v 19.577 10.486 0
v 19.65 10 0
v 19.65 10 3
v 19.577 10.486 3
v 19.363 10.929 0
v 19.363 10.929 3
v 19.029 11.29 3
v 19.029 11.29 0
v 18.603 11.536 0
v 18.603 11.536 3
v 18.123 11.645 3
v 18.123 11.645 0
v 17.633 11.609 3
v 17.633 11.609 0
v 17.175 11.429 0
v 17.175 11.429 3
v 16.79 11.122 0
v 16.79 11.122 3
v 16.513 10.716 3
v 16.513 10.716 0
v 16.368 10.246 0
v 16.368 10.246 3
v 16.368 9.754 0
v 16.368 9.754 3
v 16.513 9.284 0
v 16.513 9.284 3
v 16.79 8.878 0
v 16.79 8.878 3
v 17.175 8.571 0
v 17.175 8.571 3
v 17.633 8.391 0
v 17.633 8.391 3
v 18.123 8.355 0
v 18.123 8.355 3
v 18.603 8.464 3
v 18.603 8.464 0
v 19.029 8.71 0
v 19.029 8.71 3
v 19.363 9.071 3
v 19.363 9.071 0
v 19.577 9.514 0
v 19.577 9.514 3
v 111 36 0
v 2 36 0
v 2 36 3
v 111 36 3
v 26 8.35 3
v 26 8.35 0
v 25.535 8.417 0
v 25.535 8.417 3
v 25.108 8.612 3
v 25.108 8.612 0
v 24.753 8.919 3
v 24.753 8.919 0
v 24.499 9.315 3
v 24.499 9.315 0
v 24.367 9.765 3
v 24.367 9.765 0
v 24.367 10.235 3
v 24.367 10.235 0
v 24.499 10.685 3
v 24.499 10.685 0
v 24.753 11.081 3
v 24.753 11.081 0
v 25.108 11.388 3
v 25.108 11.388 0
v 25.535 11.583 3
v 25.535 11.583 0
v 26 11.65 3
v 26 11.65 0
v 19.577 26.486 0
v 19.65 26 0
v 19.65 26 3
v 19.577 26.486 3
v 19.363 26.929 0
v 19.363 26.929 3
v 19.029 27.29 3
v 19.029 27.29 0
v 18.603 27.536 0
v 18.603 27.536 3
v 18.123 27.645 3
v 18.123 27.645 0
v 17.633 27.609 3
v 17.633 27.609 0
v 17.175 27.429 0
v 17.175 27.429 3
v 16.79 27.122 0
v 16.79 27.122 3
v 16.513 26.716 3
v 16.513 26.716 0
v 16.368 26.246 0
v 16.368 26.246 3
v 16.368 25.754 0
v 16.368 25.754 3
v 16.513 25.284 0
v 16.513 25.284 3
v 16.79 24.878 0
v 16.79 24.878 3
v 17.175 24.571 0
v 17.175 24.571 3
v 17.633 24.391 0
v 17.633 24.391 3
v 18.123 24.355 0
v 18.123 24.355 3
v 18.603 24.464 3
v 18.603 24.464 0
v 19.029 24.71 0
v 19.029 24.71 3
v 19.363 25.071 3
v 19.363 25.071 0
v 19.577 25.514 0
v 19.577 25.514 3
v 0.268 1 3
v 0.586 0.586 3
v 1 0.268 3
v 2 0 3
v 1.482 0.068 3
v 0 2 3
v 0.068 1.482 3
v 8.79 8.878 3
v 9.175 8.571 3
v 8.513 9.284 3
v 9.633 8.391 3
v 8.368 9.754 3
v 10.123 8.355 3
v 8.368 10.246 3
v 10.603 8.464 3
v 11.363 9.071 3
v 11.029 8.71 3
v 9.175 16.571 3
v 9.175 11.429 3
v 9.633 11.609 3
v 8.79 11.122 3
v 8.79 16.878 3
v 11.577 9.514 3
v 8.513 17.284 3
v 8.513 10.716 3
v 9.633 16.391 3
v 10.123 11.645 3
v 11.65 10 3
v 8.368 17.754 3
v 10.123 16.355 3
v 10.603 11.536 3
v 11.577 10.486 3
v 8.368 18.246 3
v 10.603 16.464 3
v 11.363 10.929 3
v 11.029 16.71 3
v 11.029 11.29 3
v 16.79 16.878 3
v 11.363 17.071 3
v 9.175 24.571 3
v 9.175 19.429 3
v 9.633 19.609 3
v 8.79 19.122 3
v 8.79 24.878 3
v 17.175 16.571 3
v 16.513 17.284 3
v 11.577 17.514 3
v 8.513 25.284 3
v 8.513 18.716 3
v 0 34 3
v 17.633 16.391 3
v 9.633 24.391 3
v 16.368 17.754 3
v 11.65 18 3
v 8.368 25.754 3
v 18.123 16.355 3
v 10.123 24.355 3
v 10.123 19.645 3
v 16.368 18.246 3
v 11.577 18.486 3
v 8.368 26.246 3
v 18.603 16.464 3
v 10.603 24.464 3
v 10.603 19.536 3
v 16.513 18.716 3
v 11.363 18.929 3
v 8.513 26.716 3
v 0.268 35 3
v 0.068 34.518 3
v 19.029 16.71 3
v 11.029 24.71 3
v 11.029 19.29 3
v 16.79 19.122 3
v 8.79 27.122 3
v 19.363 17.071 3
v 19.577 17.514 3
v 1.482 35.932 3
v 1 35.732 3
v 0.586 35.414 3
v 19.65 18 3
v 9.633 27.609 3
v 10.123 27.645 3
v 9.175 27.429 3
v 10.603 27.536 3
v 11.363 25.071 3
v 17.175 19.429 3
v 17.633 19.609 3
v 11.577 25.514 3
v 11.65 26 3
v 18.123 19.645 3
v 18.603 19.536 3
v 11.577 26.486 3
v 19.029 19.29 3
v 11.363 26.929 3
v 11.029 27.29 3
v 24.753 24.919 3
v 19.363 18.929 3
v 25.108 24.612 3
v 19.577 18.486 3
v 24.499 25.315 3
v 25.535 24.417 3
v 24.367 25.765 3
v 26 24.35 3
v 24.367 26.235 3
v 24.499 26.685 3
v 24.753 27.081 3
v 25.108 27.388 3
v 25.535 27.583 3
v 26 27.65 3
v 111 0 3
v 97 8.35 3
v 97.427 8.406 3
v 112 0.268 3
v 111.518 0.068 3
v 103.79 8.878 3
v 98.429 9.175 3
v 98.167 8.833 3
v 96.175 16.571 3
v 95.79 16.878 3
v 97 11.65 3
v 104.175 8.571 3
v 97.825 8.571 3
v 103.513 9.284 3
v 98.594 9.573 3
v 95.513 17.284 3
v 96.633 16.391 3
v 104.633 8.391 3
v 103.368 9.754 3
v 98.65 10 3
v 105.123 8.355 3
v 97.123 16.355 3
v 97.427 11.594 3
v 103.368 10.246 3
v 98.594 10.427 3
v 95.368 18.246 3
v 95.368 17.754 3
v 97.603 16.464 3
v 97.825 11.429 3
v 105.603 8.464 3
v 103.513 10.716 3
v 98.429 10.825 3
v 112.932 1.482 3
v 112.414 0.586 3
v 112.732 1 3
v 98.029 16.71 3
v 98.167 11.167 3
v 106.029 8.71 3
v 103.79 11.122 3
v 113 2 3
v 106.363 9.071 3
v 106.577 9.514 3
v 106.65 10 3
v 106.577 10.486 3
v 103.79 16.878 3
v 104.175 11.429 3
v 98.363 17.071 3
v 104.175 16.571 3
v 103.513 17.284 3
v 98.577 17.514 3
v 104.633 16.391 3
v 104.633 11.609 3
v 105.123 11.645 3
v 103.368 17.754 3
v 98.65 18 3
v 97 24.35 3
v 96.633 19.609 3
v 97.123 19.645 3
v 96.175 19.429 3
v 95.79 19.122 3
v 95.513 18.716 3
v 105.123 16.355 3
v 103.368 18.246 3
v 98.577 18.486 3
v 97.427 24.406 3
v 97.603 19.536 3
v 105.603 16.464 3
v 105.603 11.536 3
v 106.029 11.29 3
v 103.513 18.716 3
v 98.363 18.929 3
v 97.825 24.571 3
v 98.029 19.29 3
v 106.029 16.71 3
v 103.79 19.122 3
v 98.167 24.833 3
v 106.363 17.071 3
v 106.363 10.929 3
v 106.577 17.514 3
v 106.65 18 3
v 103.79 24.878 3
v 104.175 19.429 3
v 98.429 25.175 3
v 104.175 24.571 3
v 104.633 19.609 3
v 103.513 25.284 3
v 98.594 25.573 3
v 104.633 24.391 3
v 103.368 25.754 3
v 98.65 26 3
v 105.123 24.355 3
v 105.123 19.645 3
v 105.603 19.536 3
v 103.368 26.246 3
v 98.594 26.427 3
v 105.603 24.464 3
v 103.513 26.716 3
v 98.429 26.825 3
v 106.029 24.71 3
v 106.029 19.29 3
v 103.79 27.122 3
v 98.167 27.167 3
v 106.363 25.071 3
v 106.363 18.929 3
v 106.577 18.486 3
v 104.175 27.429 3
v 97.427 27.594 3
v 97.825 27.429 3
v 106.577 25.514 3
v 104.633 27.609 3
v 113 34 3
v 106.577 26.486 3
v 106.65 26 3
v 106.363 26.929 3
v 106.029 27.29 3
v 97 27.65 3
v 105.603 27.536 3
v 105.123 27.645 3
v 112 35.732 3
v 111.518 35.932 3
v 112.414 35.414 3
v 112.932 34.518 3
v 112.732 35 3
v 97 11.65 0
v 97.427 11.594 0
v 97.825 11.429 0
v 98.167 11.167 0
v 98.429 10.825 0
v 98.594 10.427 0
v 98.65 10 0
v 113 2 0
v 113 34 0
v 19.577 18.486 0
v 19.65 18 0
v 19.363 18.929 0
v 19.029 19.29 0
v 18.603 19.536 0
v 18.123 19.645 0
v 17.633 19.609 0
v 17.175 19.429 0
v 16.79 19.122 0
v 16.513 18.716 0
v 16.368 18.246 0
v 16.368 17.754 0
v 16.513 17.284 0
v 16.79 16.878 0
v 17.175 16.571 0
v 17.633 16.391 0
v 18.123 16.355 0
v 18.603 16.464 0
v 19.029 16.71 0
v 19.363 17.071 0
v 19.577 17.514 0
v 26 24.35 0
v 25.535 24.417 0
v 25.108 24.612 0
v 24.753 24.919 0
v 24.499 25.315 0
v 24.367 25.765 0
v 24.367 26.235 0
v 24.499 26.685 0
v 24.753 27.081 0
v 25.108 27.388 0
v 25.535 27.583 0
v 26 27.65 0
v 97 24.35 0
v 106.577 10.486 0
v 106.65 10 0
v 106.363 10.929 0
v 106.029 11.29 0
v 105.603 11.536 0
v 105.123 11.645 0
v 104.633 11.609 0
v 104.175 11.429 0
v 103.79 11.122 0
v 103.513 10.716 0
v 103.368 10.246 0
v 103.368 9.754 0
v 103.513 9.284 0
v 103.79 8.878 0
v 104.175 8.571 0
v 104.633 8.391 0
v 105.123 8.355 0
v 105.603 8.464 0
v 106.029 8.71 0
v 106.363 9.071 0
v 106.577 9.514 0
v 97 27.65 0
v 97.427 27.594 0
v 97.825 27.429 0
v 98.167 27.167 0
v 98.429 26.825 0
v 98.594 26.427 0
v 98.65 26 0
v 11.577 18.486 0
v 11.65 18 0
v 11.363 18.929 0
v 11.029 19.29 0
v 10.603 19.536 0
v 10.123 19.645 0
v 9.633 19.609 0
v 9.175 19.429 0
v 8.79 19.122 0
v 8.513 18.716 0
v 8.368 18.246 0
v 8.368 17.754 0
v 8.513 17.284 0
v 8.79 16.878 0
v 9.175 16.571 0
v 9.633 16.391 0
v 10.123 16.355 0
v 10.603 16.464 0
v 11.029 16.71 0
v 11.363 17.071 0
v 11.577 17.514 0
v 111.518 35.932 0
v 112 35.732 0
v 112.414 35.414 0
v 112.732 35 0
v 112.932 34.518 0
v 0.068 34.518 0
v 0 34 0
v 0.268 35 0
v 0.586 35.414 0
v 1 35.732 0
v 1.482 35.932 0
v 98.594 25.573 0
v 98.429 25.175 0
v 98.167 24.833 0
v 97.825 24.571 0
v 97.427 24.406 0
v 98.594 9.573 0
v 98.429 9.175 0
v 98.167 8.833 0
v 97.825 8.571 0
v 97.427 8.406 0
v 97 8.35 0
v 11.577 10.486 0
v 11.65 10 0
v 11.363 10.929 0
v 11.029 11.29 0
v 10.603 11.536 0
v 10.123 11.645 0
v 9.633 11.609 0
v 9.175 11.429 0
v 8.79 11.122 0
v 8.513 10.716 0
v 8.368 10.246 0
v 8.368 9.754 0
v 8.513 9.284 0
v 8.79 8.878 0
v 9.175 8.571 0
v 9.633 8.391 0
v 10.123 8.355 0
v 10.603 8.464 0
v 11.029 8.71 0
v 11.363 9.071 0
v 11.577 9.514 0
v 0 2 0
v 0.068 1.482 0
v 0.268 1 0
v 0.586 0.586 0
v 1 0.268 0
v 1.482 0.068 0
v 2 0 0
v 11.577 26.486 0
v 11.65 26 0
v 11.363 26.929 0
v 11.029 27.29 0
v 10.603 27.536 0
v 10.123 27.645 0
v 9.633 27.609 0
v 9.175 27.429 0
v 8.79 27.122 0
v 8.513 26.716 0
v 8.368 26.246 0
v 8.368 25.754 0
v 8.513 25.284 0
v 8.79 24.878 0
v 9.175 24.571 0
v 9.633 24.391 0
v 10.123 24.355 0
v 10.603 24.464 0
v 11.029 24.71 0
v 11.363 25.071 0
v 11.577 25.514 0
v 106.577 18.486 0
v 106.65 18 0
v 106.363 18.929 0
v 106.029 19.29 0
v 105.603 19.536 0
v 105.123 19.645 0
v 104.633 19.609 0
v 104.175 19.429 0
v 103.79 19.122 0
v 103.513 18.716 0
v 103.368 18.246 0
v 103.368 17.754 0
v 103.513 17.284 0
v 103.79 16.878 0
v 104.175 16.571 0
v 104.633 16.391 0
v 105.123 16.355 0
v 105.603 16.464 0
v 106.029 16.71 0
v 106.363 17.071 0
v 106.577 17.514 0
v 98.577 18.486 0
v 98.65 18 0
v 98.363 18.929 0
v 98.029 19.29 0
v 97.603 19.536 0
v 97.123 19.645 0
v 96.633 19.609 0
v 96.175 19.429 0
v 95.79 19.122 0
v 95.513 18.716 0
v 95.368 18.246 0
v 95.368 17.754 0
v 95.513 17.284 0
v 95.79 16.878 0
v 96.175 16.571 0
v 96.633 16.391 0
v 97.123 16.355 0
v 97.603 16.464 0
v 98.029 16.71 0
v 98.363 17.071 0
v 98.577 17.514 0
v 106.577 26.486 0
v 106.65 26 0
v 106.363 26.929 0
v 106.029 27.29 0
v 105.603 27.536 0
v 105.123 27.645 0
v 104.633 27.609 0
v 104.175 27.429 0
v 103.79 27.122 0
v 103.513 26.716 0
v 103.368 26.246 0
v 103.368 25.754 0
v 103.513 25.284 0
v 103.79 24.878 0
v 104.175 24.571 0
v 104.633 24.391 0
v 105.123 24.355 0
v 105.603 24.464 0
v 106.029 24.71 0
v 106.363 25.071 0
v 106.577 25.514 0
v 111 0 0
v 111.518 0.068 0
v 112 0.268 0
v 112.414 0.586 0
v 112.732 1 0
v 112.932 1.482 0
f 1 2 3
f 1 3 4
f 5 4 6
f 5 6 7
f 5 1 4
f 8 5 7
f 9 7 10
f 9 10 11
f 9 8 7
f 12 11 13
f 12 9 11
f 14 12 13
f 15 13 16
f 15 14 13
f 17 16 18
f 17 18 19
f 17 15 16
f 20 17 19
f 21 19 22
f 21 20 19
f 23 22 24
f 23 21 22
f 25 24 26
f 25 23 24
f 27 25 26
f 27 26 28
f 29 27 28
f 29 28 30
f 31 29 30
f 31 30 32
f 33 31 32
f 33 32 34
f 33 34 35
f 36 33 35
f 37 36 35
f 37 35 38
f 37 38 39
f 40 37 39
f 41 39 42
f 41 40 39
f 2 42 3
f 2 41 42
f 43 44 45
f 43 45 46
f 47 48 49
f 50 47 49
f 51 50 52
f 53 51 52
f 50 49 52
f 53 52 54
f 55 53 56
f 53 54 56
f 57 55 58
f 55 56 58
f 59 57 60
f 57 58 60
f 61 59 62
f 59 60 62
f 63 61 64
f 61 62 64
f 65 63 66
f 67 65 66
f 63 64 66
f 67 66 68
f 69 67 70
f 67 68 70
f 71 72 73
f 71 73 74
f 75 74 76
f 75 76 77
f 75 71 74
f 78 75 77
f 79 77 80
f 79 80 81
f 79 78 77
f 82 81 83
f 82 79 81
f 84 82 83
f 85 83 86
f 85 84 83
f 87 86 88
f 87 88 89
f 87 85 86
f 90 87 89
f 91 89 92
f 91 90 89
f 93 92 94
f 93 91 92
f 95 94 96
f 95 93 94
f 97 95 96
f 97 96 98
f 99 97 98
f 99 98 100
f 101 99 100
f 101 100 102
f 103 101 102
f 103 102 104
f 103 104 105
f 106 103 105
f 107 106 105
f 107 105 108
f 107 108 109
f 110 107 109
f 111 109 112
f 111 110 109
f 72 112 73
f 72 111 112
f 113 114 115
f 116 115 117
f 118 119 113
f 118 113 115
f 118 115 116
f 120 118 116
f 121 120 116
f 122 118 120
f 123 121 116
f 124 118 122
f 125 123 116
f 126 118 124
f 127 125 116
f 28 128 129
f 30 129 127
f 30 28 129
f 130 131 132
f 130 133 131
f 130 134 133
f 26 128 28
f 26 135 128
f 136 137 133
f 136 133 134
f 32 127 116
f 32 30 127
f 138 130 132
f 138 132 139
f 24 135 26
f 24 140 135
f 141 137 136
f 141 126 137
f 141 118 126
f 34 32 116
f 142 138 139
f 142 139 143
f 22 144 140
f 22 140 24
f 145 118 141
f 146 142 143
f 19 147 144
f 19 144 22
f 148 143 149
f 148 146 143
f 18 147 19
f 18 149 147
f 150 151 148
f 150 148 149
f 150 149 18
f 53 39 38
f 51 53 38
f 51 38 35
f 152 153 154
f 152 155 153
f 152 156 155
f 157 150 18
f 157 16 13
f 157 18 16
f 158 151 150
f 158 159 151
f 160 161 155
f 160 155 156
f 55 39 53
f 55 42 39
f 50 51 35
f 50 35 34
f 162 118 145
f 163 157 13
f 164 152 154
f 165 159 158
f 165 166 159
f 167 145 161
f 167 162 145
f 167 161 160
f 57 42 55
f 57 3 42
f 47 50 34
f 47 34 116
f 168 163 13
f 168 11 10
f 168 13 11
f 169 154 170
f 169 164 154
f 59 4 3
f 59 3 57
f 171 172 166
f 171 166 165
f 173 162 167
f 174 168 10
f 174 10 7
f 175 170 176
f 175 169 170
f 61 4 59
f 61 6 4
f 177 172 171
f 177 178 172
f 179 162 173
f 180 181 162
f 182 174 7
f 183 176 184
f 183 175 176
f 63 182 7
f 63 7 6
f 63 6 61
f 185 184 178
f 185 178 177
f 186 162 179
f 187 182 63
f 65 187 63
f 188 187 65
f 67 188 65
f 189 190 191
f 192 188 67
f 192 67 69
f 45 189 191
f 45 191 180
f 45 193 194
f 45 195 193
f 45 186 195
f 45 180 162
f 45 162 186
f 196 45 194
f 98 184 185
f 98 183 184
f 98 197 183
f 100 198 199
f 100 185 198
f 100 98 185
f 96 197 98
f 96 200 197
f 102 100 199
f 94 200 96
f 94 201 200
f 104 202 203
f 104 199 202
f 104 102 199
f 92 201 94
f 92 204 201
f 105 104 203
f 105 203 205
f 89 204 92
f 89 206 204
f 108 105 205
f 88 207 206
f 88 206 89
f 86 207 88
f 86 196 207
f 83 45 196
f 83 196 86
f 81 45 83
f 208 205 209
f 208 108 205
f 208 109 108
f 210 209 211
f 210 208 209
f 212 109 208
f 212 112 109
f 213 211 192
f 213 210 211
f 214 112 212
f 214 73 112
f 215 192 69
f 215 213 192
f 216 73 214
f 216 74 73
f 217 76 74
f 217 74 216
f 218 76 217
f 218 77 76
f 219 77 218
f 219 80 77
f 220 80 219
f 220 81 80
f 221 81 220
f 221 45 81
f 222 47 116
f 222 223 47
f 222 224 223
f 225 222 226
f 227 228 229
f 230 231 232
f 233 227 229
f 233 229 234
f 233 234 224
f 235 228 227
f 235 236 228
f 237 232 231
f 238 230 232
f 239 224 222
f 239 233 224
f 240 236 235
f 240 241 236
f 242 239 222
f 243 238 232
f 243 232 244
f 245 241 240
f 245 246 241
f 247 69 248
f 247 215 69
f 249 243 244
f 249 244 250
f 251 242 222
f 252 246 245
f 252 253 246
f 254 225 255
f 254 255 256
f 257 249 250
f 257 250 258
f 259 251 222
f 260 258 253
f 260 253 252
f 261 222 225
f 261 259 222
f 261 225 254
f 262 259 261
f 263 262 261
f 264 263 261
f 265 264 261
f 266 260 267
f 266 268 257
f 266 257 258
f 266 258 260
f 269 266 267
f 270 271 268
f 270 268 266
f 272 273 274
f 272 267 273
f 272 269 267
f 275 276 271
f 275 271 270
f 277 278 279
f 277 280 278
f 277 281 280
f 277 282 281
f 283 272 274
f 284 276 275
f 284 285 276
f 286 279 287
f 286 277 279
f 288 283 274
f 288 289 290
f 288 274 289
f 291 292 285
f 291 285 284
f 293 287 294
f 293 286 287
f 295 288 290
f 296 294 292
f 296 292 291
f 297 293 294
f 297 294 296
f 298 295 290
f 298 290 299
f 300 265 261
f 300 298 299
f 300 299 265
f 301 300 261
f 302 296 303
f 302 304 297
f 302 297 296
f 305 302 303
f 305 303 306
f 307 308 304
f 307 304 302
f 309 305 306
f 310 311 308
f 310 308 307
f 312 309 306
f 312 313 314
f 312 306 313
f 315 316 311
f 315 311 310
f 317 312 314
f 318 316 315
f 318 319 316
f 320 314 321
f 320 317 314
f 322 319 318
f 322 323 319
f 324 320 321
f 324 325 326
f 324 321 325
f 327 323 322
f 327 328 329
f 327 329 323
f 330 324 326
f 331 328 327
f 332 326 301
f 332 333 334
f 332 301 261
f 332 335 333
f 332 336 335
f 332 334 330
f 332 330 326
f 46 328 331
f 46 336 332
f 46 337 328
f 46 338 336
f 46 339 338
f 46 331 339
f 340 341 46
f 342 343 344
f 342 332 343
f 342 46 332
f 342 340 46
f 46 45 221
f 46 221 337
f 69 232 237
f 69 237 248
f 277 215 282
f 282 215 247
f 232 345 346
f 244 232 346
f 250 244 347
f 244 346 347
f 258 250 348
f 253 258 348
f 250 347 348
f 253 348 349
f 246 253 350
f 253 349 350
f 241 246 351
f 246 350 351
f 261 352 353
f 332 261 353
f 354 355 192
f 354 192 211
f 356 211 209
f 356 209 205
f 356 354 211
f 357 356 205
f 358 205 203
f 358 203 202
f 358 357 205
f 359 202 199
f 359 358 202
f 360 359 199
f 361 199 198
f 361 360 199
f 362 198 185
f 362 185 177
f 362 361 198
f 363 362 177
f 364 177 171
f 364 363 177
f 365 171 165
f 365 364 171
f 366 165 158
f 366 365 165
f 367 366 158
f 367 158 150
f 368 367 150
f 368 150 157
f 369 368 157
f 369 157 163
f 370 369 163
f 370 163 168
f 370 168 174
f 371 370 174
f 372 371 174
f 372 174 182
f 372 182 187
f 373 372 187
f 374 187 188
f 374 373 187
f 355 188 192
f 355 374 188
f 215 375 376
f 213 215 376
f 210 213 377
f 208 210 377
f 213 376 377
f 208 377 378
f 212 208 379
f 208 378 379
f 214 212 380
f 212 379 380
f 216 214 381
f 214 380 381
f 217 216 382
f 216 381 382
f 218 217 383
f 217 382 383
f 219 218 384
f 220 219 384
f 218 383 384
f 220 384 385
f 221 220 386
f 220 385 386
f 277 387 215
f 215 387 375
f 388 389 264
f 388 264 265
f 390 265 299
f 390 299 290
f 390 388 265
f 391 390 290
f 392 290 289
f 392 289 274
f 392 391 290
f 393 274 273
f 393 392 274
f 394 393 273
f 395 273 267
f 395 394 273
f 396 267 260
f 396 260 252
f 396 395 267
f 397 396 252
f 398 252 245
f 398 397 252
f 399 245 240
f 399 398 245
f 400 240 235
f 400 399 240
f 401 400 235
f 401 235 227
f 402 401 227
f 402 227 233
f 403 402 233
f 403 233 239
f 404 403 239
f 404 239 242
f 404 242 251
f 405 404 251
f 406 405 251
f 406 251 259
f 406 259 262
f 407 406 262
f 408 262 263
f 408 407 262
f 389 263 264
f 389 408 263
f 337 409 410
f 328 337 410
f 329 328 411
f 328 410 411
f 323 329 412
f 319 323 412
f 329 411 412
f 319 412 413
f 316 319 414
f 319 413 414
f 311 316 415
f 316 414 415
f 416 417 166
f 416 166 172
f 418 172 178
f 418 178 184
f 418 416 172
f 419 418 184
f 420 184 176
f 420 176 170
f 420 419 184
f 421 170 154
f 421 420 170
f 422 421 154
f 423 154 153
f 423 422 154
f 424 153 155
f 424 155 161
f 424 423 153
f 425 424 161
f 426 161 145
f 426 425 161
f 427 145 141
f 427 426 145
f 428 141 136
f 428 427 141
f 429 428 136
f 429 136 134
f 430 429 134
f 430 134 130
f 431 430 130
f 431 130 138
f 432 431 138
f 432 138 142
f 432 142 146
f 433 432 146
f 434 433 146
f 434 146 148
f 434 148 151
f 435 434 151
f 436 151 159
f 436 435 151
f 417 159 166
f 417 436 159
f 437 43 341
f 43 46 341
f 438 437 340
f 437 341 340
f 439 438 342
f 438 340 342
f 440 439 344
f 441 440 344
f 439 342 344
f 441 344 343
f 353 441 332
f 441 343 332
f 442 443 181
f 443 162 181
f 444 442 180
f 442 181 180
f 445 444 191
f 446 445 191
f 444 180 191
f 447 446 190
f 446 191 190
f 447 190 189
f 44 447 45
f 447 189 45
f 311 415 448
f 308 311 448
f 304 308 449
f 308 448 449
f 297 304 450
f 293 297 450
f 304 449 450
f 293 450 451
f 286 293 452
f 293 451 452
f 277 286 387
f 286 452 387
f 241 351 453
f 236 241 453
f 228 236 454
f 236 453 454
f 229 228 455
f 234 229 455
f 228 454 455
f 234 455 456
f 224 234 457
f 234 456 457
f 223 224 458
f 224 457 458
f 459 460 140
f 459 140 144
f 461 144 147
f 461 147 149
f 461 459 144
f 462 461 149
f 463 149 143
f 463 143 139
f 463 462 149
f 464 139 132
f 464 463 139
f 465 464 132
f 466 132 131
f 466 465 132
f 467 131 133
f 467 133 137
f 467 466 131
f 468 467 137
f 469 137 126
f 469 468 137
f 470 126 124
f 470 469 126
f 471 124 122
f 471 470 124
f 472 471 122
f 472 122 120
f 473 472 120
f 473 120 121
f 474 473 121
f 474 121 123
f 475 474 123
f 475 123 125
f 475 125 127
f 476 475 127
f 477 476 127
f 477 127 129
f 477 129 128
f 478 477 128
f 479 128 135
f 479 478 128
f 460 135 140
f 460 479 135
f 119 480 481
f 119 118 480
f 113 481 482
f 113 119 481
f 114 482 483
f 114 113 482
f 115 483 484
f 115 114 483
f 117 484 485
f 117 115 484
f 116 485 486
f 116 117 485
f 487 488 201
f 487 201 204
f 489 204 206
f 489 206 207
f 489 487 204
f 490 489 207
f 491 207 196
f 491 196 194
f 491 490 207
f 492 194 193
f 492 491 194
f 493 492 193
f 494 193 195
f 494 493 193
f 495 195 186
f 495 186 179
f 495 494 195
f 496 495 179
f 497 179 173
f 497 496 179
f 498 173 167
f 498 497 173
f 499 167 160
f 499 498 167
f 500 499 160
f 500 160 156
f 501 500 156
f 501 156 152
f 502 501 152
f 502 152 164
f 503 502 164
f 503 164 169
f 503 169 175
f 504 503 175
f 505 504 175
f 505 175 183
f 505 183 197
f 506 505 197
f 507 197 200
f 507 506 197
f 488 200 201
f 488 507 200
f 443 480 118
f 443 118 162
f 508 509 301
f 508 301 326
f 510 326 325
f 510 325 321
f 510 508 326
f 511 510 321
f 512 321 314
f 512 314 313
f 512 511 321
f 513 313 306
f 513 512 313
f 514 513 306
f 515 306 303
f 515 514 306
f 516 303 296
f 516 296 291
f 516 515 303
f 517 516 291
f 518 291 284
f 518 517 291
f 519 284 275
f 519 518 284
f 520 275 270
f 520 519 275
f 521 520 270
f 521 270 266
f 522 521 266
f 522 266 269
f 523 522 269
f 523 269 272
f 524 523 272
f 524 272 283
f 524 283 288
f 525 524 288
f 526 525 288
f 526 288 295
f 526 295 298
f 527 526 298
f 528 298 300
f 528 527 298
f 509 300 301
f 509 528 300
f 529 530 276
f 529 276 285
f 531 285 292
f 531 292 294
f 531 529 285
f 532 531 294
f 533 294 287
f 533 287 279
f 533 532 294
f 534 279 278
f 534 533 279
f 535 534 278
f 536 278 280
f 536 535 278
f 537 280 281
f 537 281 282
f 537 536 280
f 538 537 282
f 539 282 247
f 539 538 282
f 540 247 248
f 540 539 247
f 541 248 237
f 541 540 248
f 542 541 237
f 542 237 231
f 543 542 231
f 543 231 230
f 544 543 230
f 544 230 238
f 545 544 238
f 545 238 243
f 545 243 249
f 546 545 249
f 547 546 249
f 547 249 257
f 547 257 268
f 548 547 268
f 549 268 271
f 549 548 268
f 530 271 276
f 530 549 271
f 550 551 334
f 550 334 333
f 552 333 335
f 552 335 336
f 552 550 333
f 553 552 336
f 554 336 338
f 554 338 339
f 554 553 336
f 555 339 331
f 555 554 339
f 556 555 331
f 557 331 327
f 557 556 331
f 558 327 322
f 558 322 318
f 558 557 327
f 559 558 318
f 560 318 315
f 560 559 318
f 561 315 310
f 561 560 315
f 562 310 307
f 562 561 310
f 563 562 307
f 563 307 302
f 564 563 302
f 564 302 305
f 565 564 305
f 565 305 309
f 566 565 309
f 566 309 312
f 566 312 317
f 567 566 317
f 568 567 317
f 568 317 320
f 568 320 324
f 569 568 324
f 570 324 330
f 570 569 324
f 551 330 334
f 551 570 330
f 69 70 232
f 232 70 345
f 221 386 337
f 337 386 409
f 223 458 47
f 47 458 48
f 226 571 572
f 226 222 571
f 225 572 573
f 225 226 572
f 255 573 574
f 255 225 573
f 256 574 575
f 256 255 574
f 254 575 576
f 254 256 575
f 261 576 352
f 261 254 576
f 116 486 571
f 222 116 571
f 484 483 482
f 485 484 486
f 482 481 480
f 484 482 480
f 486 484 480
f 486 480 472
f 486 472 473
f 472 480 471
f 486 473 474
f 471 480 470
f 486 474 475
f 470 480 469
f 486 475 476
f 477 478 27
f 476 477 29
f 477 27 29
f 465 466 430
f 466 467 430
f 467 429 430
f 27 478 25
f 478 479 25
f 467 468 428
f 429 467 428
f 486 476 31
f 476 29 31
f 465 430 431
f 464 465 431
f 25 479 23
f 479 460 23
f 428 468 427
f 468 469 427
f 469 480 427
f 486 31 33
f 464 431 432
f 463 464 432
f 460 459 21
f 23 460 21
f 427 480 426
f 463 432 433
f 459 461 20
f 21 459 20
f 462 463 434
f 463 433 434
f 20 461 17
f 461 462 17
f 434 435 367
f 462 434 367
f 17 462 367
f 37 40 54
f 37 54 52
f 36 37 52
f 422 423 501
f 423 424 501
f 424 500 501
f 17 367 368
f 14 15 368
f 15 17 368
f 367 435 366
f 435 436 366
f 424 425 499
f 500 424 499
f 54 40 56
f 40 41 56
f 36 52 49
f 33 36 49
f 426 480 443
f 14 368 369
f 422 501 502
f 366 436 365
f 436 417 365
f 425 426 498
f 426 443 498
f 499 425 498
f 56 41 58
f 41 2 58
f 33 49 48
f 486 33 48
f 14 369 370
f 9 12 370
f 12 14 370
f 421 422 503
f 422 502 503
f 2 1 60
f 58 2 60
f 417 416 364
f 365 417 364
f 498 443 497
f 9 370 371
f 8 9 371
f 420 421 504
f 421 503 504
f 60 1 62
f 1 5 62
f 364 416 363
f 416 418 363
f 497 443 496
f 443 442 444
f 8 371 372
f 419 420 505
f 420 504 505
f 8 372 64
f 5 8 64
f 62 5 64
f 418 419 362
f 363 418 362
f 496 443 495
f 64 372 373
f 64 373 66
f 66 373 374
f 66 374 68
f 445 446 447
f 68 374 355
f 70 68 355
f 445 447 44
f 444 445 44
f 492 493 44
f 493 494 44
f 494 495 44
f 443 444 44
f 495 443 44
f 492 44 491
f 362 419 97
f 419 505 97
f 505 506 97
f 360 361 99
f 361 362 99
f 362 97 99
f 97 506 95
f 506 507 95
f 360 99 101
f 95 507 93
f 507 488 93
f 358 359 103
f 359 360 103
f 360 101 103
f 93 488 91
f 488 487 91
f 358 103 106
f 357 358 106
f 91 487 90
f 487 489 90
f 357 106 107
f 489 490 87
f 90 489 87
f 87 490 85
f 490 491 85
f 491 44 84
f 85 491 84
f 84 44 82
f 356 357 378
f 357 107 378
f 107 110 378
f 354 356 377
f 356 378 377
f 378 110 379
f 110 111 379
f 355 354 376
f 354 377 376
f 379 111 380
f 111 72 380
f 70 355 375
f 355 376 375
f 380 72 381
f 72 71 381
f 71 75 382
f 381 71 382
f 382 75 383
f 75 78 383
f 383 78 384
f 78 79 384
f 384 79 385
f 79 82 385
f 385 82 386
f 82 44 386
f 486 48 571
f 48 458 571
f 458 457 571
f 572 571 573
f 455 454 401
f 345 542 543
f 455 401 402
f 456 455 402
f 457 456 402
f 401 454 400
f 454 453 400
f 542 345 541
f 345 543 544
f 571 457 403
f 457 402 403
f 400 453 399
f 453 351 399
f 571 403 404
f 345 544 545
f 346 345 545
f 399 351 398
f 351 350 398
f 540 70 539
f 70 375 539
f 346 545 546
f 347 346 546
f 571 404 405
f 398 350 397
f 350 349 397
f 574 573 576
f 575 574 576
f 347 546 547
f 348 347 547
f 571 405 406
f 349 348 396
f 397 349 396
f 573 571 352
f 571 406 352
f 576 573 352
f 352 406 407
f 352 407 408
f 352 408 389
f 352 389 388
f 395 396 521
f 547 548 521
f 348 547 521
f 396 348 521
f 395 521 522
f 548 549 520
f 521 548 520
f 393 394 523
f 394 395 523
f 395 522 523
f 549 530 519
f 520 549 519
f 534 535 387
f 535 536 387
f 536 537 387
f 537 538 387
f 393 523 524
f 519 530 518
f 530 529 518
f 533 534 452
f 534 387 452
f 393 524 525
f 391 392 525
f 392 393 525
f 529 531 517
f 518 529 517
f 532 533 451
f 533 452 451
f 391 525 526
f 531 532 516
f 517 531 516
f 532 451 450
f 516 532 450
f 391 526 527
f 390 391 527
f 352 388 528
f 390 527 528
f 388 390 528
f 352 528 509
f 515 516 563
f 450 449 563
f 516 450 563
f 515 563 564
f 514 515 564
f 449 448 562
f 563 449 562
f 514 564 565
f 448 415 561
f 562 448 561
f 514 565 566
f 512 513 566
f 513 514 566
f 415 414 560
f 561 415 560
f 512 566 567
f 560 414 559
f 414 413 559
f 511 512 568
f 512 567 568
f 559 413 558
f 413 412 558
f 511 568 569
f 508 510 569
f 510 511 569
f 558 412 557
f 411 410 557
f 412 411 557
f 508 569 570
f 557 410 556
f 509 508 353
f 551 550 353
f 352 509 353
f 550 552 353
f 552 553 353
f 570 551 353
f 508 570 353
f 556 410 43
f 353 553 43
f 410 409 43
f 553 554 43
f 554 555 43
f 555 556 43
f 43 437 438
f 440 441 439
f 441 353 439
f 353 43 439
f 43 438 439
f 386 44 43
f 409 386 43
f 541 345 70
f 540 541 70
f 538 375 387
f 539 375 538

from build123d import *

# Parameters (mm, degrees)
SKETCH_1_W      = 113
SKETCH_1_H      = 36
SKETCH_1_R      = 1.65
EXTRUDE_1_DEPTH = 3
FILLET_1_R      = 2


with BuildPart() as part:
    # 草图1 → 凸台-拉伸1 (new body)
    with BuildSketch(Plane.XY):
        with Locations((56.5, 18)):
            Rectangle(SKETCH_1_W, SKETCH_1_H)
        with Locations((10, 10)):
            Circle(SKETCH_1_R, mode=Mode.SUBTRACT)
        with Locations((18, 10)):
            Circle(SKETCH_1_R, mode=Mode.SUBTRACT)
        with BuildLine():
            ThreePointArc((26, 8.35), (24.35, 10), (26, 11.65))
            Line((26, 11.65), (97, 11.65))
            ThreePointArc((97, 11.65), (98.166726189, 11.166726189), (98.65, 10))
            ThreePointArc((98.65, 10), (98.166726189, 8.833273811), (97, 8.35))
            Line((97, 8.35), (26, 8.35))
        make_face(mode=Mode.SUBTRACT)
        with Locations((105, 10)):
            Circle(SKETCH_1_R, mode=Mode.SUBTRACT)
        with Locations((10, 18)):
            Circle(SKETCH_1_R, mode=Mode.SUBTRACT)
        with Locations((18, 18)):
            Circle(SKETCH_1_R, mode=Mode.SUBTRACT)
        with Locations((10, 26)):
            Circle(SKETCH_1_R, mode=Mode.SUBTRACT)
        with Locations((18, 26)):
            Circle(SKETCH_1_R, mode=Mode.SUBTRACT)
        with BuildLine():
            ThreePointArc((26, 24.35), (24.35, 26), (26, 27.65))
            Line((26, 27.65), (97, 27.65))
            ThreePointArc((97, 27.65), (98.166726189, 27.166726189), (98.65, 26))
            ThreePointArc((98.65, 26), (98.166726189, 24.833273811), (97, 24.35))
            Line((97, 24.35), (26, 24.35))
        make_face(mode=Mode.SUBTRACT)
        with Locations((97, 18)):
            Circle(SKETCH_1_R, mode=Mode.SUBTRACT)
        with Locations((105, 18)):
            Circle(SKETCH_1_R, mode=Mode.SUBTRACT)
        with Locations((105, 26)):
            Circle(SKETCH_1_R, mode=Mode.SUBTRACT)
    extrude(amount=EXTRUDE_1_DEPTH)

    # 圆角1
    fillet_1_edges = [part.edges().sort_by_distance(p)[0] for p in [
        (0, 0, 1.5),
        (0, 36, 1.5),
        (113, 36, 1.5),
        (113, 0, 1.5),
    ]]
    fillet(fillet_1_edges, radius=FILLET_1_R)


solid = part.part
